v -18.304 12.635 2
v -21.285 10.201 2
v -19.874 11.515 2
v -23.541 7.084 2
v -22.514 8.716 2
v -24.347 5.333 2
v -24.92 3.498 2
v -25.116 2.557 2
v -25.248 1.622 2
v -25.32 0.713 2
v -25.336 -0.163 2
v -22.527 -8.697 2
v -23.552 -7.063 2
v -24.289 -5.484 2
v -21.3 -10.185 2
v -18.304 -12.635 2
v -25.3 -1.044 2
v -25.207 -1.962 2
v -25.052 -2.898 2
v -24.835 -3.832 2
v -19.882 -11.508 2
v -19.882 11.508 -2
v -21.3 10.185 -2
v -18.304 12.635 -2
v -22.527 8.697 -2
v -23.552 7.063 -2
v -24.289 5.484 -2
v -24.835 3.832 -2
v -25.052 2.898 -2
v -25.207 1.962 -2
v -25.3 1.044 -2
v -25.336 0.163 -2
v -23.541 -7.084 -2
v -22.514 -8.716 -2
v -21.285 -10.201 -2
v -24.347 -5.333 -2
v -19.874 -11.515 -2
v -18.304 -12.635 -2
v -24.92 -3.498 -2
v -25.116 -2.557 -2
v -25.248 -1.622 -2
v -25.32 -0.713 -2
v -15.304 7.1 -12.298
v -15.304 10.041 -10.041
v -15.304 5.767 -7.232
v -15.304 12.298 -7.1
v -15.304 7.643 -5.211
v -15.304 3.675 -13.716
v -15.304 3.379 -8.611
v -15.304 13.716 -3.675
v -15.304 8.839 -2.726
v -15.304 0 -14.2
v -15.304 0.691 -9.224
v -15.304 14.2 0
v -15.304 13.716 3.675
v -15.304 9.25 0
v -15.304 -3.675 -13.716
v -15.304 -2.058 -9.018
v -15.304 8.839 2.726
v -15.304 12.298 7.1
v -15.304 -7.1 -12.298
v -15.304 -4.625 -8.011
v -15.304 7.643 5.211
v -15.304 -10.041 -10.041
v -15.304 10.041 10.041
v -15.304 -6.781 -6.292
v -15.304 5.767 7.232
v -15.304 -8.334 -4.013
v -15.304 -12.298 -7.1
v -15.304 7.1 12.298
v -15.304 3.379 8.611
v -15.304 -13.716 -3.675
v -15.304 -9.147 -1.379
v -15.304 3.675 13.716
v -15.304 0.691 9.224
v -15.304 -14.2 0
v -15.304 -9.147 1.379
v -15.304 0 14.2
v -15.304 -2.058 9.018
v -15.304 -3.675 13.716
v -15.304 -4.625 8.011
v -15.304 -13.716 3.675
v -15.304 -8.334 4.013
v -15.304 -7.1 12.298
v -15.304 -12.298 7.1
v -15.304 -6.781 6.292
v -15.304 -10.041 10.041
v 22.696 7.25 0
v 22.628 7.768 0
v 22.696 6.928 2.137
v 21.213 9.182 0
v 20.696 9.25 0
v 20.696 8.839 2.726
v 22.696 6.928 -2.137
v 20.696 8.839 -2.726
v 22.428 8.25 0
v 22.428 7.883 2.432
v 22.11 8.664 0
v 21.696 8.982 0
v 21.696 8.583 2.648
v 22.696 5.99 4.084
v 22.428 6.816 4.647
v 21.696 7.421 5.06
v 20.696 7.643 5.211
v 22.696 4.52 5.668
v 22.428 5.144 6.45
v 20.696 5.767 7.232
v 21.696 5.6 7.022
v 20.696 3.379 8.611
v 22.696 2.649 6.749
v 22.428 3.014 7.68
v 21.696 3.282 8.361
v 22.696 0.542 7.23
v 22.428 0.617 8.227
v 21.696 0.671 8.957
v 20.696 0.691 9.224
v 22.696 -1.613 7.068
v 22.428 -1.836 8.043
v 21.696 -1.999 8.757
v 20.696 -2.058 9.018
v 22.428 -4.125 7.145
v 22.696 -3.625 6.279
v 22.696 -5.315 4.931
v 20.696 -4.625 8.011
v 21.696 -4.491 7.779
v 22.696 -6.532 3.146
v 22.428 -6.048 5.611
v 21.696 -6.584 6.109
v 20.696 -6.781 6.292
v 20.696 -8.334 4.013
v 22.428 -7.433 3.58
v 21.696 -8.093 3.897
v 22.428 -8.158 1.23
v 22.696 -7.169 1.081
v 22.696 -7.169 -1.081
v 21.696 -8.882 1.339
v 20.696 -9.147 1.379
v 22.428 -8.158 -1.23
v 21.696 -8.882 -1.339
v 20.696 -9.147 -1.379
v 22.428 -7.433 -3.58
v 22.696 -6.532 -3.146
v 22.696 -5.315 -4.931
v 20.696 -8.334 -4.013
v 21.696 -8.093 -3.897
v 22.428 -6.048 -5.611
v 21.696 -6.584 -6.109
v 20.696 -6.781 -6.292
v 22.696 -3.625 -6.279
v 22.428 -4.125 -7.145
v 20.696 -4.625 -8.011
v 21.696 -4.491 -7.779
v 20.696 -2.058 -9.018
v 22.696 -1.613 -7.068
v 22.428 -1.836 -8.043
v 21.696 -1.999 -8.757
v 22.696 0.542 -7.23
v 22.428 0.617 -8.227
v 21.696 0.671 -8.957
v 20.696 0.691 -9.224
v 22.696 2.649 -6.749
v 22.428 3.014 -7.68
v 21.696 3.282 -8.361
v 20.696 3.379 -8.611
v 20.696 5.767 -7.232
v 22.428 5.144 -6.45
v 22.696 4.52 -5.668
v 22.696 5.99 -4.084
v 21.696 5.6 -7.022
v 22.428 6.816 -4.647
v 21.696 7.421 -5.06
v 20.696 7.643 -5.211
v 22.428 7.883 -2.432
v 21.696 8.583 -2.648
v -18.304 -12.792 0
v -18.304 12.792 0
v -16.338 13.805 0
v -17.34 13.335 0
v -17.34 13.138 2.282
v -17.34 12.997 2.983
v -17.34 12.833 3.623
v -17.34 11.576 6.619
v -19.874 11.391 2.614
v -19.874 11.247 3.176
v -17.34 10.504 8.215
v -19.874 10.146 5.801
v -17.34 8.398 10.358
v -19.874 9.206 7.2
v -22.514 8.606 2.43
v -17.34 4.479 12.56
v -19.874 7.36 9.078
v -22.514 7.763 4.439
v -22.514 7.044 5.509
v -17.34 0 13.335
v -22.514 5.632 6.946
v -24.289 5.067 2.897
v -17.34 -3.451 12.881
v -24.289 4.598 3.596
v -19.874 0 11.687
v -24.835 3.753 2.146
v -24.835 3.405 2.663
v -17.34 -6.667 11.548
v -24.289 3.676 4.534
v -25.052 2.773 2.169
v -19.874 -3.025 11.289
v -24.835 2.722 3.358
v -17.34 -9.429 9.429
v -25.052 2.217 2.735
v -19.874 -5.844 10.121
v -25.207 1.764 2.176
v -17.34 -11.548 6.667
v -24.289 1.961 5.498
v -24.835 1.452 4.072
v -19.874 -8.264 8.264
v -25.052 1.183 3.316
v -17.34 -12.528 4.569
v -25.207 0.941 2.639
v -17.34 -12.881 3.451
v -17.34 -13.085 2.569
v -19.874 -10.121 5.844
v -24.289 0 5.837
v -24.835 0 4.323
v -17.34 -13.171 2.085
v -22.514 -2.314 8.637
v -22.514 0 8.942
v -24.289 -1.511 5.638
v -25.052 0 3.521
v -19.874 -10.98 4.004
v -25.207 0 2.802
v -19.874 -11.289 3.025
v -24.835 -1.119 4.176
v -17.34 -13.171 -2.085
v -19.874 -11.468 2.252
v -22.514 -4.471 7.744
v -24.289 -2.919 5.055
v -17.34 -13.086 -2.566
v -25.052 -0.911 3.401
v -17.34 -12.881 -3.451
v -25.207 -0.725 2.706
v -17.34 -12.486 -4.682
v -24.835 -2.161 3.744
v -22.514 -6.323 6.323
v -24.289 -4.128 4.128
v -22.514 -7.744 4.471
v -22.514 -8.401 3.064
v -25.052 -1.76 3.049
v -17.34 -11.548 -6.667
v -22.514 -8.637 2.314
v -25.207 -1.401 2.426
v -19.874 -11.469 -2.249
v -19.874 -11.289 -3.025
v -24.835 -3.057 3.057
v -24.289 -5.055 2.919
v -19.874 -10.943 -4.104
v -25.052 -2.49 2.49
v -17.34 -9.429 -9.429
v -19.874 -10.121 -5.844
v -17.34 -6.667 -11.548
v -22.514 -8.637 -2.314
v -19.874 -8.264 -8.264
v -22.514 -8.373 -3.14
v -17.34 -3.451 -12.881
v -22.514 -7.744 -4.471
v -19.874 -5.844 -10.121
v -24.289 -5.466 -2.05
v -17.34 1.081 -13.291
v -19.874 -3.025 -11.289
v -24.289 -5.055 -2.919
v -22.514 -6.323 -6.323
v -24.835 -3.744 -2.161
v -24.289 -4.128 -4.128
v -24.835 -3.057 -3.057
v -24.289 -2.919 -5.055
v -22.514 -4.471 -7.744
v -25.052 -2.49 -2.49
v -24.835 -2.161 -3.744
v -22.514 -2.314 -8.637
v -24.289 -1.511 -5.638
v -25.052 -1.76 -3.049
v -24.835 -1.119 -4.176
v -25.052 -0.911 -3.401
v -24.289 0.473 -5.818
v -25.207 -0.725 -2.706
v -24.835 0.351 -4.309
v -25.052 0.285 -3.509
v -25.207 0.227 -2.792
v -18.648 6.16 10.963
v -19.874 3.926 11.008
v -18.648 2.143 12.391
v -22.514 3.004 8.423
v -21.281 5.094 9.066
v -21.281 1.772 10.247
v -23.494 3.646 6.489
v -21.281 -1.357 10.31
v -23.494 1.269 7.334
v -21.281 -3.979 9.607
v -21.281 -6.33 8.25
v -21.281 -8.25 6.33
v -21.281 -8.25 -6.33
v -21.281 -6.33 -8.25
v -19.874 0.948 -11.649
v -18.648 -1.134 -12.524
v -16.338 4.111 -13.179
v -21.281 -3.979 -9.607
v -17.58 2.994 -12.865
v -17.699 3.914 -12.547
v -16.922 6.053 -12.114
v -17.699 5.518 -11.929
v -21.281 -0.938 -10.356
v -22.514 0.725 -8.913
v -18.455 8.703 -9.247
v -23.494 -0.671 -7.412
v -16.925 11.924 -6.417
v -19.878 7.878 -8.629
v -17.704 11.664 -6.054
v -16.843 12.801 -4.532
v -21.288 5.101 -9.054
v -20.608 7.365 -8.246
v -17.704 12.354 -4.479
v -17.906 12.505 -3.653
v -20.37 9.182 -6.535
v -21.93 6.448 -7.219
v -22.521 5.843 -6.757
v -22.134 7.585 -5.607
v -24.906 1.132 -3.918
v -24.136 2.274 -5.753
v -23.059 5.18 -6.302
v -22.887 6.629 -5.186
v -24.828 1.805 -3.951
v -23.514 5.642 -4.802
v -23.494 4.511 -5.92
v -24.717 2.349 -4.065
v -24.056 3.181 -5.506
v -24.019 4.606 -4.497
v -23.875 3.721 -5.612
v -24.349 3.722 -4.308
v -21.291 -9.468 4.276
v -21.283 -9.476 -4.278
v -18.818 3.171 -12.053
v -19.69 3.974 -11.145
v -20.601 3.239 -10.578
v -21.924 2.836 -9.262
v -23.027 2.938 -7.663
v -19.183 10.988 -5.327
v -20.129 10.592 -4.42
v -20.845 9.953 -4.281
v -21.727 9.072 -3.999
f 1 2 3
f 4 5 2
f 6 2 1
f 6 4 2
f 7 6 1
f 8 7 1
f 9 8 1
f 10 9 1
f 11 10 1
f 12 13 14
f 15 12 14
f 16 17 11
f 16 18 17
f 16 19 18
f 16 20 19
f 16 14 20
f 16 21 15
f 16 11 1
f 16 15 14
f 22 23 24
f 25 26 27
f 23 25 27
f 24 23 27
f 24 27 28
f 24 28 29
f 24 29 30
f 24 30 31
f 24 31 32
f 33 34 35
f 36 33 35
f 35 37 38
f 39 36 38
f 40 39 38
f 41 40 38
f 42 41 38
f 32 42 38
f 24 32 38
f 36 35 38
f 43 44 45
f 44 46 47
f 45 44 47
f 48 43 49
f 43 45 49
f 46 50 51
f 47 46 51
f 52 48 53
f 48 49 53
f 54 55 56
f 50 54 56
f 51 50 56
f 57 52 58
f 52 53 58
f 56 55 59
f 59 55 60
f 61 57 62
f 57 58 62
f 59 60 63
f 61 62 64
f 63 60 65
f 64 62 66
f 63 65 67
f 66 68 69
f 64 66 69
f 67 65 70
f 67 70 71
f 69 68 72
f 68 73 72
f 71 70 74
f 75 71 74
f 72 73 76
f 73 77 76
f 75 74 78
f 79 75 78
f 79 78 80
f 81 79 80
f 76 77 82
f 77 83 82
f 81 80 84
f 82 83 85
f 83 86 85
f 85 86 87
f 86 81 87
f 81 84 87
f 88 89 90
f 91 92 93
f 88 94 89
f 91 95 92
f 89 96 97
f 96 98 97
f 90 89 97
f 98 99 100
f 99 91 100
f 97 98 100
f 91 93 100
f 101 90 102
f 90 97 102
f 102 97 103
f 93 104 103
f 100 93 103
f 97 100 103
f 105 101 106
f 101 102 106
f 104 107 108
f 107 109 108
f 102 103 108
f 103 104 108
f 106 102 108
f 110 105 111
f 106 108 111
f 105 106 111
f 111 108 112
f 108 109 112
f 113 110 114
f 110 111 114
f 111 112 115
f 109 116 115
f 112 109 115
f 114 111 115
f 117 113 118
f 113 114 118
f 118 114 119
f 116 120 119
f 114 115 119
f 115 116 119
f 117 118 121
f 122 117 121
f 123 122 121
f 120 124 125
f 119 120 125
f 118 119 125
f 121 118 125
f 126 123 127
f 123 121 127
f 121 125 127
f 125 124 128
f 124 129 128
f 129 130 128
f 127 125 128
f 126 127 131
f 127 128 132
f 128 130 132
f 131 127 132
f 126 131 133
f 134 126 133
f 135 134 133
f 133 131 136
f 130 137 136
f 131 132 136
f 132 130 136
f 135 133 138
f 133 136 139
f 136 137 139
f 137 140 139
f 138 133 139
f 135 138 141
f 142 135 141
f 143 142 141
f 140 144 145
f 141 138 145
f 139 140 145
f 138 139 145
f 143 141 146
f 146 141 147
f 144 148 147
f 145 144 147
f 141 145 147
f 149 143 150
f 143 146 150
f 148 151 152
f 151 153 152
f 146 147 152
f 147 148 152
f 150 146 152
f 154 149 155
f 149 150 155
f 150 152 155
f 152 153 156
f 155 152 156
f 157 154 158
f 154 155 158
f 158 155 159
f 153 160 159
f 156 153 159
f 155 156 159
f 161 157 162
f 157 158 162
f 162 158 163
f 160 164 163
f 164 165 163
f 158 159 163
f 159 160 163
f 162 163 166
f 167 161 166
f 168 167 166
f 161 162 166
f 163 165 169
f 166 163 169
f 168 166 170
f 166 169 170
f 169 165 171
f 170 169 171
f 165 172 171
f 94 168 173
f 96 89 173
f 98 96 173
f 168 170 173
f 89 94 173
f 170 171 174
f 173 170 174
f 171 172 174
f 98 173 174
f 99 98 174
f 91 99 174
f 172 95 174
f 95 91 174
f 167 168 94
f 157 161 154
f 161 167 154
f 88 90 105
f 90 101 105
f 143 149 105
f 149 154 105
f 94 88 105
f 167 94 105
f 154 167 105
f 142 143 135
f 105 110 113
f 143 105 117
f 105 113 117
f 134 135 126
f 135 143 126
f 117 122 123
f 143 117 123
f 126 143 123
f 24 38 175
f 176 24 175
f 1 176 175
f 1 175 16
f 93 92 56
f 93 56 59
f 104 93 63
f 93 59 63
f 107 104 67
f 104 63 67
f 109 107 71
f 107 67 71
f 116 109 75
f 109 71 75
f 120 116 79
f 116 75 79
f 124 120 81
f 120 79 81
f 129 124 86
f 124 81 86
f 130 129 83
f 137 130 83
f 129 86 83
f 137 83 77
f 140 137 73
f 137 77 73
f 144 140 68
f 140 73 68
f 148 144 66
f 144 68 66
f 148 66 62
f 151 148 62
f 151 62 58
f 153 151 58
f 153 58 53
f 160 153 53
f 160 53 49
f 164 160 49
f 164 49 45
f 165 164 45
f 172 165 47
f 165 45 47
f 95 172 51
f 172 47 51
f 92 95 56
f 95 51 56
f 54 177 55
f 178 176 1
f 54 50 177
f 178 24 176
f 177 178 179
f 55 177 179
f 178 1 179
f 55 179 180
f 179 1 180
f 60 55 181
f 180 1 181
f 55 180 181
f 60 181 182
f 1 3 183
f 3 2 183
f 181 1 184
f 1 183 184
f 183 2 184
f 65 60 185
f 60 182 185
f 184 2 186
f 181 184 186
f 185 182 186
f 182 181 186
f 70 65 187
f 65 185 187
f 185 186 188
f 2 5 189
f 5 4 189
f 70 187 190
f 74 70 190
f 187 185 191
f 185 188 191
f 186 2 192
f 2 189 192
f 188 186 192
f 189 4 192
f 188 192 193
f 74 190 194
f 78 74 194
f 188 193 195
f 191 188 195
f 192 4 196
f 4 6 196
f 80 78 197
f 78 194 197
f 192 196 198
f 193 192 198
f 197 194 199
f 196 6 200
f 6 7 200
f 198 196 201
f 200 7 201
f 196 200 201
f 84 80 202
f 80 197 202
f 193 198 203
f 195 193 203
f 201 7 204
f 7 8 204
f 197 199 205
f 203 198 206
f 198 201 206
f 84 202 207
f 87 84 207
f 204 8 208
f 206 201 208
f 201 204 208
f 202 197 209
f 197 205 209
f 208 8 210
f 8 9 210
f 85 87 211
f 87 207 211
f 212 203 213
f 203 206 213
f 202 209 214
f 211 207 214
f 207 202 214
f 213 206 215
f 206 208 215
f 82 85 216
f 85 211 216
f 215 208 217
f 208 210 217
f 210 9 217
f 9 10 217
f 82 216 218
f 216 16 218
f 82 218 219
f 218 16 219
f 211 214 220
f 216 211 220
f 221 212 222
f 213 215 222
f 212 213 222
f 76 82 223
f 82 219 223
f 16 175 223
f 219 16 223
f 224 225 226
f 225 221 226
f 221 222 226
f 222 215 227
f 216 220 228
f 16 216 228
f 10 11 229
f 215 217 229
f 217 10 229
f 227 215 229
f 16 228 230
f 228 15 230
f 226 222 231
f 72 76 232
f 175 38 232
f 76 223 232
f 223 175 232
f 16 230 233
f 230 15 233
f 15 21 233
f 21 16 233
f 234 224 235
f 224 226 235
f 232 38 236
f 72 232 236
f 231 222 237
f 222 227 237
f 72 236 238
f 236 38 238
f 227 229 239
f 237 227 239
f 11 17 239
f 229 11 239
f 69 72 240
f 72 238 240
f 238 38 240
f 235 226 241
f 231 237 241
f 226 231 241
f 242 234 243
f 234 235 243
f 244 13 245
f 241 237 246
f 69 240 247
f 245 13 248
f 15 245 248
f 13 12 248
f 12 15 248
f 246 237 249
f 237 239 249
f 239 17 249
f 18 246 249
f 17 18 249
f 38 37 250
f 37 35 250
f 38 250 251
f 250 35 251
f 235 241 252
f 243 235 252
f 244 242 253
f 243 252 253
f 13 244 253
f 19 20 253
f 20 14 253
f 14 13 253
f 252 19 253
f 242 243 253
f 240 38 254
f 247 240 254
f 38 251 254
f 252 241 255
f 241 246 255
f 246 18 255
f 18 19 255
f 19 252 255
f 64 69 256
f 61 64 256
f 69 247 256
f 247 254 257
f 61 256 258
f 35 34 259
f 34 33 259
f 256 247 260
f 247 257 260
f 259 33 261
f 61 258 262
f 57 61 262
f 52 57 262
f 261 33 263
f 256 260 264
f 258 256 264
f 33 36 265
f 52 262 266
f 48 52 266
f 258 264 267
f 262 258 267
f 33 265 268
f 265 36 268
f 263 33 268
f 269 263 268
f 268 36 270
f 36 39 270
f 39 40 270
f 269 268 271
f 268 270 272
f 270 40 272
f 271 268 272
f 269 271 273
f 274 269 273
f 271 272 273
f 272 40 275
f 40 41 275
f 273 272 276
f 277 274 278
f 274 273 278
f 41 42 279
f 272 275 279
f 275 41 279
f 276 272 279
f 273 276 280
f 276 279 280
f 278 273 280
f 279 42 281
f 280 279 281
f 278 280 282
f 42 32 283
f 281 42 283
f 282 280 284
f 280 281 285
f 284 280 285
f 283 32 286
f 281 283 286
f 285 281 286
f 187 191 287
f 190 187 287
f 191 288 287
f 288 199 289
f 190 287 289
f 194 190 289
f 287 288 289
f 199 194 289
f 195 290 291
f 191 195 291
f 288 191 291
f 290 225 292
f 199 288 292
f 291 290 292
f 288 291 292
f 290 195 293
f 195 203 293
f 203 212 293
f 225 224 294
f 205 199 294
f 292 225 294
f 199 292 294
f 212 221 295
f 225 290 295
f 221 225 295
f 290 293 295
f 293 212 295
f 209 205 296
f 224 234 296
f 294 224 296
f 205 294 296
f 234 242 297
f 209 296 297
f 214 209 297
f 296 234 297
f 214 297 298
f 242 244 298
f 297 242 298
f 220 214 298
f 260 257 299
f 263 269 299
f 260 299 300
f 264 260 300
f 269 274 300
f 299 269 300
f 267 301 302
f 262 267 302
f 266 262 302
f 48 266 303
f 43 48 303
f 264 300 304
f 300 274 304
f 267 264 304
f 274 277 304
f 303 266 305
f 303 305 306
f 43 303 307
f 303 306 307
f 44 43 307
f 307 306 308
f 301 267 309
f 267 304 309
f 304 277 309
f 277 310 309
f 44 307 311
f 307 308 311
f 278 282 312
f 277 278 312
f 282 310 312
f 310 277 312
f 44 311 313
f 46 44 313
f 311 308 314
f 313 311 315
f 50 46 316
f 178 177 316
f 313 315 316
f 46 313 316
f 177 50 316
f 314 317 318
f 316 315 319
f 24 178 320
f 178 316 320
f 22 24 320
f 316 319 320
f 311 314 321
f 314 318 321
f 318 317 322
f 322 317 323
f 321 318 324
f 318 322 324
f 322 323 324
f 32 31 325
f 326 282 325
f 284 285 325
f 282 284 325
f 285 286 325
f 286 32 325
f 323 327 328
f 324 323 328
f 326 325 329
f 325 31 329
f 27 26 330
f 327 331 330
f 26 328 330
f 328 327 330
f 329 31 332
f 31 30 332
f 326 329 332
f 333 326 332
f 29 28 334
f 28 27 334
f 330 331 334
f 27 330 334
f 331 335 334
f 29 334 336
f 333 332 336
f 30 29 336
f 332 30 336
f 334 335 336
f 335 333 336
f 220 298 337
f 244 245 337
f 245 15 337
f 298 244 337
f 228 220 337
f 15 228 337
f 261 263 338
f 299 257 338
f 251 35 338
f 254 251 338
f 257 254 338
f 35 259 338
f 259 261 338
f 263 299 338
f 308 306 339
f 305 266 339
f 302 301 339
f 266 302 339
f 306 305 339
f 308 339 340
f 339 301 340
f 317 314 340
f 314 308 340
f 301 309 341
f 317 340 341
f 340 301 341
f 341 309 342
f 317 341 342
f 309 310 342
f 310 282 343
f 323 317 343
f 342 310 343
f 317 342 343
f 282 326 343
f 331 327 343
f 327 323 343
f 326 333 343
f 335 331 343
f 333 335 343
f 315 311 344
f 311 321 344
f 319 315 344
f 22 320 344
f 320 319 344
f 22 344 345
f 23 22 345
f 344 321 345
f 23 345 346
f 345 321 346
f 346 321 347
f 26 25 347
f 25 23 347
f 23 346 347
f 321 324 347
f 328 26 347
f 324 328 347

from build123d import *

# Parameters (mm, degrees)
F2_W     = 7.449934
F2_H     = 4
F4_DEPTH = 17.733243
F3_R     = 2


with BuildPart() as f1:
    # F0 (on Top) → F1 (revolve)
    with BuildSketch(Plane.XY):
        with BuildLine():
            Line((-25.471063, 0), (22.695719, 0))
            Line((22.695719, 0), (22.695719, 9.25))
            Line((22.695719, 9.25), (-15.304281, 9.25))
            Line((-15.304281, 9.25), (-15.304281, 14.2))
            ThreePointArc((-15.304281, 14.2), (-22.667339, 8.732174), (-25.471063, 0))
        make_face()
    revolve(axis=Axis((-25.471063, 0, 0), (1, 0, 0)))

    # F2 (on Front) → F4 (cut, symmetric)
    with BuildSketch(Plane.XZ):
        with Locations((-22.029248, 0)):
            Rectangle(F2_W, F2_H)
    extrude(amount=F4_DEPTH, both=True, mode=Mode.SUBTRACT)

    # F3
    f3_edges = [f1.edges().sort_by_distance(p)[0] for p in [
        (22.695719, -9.25, 0),
    ]]
    fillet(f3_edges, radius=F3_R)


solid = f1.part
